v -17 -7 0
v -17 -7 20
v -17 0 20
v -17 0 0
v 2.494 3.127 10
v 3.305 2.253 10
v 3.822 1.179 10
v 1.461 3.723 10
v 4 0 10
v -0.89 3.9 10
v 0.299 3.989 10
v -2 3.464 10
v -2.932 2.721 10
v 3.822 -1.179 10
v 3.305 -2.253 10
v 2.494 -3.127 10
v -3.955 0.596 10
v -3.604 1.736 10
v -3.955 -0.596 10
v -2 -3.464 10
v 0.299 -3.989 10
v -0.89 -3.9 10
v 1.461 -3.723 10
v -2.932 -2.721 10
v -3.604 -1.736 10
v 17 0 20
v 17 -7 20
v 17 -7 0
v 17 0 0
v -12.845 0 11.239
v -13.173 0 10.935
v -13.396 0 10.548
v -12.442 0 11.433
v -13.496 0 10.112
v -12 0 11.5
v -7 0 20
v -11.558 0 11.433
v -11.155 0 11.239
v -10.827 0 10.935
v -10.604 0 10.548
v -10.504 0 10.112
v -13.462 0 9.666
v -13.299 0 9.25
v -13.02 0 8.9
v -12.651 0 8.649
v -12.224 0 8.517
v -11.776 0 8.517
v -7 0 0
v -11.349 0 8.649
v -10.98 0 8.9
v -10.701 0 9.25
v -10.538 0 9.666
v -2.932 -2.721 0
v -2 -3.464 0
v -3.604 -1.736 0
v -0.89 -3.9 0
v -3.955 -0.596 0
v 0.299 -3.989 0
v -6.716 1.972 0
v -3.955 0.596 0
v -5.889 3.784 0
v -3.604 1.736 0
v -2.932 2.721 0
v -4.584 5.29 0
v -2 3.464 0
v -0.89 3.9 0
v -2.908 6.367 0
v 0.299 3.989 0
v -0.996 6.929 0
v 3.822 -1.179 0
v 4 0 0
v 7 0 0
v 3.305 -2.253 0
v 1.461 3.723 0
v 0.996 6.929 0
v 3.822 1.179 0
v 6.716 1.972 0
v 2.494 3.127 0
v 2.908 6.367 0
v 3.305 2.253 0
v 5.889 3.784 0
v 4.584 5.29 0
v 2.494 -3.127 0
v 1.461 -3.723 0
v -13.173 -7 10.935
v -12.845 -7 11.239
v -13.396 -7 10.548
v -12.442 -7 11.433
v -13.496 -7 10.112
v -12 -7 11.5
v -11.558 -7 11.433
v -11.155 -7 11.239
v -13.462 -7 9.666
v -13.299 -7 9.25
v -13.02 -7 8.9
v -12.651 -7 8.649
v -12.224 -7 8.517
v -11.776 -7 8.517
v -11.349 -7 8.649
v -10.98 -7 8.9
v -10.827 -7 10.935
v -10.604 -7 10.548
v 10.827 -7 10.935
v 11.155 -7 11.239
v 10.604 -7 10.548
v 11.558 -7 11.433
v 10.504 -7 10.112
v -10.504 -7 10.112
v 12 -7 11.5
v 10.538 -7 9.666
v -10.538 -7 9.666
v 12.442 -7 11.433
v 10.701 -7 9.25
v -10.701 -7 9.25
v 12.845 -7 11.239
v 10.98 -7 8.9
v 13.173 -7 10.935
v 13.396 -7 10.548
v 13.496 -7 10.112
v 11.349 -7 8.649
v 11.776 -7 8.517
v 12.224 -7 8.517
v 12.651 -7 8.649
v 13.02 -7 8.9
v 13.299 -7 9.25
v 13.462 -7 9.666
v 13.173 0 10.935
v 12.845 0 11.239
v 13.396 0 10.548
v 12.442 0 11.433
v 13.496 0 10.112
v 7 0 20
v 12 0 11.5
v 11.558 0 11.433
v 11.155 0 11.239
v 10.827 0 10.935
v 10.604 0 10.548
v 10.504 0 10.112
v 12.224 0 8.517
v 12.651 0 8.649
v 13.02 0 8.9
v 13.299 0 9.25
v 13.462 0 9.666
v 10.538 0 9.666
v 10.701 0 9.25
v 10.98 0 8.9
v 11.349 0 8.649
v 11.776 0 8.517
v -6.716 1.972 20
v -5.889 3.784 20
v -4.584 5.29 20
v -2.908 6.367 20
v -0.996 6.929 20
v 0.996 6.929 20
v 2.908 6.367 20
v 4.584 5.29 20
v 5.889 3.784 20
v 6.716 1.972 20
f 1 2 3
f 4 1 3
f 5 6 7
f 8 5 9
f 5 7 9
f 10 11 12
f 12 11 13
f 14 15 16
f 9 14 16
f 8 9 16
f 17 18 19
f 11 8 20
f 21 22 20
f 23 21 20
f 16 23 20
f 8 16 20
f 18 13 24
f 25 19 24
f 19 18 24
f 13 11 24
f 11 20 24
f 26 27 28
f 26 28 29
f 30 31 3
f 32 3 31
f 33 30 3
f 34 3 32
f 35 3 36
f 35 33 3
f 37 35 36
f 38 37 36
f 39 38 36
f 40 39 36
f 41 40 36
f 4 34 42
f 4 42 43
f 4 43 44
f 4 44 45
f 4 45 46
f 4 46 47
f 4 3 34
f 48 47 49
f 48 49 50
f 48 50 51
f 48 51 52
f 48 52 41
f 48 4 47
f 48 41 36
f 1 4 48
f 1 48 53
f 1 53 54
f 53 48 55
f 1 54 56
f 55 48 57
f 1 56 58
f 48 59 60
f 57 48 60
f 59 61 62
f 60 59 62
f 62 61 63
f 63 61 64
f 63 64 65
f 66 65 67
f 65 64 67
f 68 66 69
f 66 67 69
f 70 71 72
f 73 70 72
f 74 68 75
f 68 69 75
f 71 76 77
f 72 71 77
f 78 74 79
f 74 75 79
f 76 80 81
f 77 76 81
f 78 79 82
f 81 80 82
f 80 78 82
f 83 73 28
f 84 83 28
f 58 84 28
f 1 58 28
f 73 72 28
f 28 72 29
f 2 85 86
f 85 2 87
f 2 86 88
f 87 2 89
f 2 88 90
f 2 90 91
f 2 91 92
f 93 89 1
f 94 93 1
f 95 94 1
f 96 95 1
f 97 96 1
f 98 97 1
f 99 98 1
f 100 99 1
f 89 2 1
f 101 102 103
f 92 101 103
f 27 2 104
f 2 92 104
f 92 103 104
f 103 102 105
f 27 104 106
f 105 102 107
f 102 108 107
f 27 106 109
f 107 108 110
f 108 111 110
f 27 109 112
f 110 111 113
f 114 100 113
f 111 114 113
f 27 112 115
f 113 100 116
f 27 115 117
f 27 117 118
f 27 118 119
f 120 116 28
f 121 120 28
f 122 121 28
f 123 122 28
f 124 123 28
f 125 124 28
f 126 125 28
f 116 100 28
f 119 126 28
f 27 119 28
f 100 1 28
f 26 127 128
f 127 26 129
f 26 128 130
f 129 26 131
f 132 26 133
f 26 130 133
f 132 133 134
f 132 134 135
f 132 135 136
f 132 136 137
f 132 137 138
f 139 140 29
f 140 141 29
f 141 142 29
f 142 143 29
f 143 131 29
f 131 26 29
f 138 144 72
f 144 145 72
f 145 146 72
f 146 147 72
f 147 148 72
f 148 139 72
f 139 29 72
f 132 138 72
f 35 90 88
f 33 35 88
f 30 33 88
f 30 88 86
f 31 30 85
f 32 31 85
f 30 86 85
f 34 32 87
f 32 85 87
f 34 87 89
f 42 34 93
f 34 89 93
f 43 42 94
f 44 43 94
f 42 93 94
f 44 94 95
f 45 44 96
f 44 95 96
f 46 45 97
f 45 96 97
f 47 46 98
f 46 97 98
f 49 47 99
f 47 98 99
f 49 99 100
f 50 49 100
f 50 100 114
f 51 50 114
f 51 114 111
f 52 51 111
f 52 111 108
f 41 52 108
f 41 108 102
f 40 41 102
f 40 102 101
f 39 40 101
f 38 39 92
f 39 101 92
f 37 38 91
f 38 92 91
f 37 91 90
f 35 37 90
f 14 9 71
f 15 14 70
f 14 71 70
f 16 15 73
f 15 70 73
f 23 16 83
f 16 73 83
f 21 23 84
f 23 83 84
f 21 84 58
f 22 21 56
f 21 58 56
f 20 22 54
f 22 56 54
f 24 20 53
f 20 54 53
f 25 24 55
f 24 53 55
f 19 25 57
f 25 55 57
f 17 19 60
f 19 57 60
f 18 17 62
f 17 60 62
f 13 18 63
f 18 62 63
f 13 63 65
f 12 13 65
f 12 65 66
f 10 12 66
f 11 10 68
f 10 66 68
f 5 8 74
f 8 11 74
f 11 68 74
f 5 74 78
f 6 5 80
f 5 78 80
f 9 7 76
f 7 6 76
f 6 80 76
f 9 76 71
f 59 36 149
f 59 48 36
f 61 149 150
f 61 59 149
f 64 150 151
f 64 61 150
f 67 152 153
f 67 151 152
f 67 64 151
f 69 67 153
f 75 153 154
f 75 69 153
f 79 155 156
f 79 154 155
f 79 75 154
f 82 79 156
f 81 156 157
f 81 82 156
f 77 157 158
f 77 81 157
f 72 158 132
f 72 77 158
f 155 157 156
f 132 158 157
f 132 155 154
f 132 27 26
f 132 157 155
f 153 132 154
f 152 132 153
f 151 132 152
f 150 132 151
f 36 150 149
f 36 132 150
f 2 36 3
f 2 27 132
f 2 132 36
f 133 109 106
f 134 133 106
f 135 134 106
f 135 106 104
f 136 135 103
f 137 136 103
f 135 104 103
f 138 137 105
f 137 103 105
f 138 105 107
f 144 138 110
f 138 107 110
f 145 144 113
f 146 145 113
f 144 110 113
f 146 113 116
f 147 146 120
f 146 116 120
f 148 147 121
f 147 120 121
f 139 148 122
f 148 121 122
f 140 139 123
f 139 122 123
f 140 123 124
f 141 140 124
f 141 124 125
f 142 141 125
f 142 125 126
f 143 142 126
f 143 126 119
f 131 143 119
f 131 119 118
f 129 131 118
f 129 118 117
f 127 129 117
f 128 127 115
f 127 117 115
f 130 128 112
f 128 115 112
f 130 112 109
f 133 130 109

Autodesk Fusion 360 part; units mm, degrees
sketch "Sketch1" plane through (0, 0, 0) normal (0, 0, 1) x (1, 0, 0)
  circle A0 centre (0, 0) radius 4
  circle A1 centre (0, 0) radius 7
  line L0 (0, -6) -> (0, -7.3)
  line L1 (0, -7) -> (17, -7)
  line L2 (17, -7) -> (17, 0)
  line L3 (17, 0) -> (0, 0)
  line L4 (0, 0) -> (0, -7)
  line L5 (0, -7) -> (-17, -7)
  line L6 (-17, -7) -> (-17, 0)
  line L7 (-17, 0) -> (0, 0)
  line L8 (0, 0) -> (0, -7)
  line L9 (0.2459, 6.9957) -> (17, 0)
  line L10 (0.2459, 6.9957) -> (-17, 0)
  dimension "d1" = 8
  dimension "d2" = 14
  dimension "d3" = 17
  dimension "d4" = 7
extrude "Extrude1" add sketch "Sketch1" along normal blind 20 contours A0 A1 L0 L3 L4 L8 | A0 A1 L3 L7 L9 L10 | A0 A1 L0 L4 L7 L8 | A1 L1 L2 L3 | A1 L5 L6 L7 | A1 L9 | A1 L10
sketch "Sketch2" plane through (0, 0, 20) normal (0, 0, 1) x (-1, 0, 0)
  circle A0 centre (0, 0) radius 4
  line L0 (17, 7) -> (-17, 7)
  line L1 (-17, 7) -> (-17, 0)
  line L2 (-17, 0) -> (-7, 0)
  arc A1 (-7, 0) -> (7, 0) centre (0, 0) ccw
  line L3 (7, 0) -> (17, 0)
  line L4 (17, 0) -> (17, 7)
  circle A2 centre (0, 0) radius 4
extrude "Extrude2" add sketch "Sketch2" against normal blind 10 contours A0 A2
sketch "Sketch3" plane through (0, 0, 0) normal (0, 1, 0) x (-1, 0, 0)
  line L0 (-17, 0) -> (-7, 0)
  line L1 (-7, 0) -> (-7, 20)
  line L2 (-7, 20) -> (-17, 20)
  line L3 (-17, 20) -> (-17, 0)
  line L4 (-12, 0) -> (-12, 20) construction
  line L5 (-17, 10) -> (-7, 10) construction
  circle A0 centre (-12, 10) radius 1.5
  line L6 (0, 20) -> (0, 0) construction
  circle A1 centre (12, 10) radius 1.5
  dimension "d9" = 3
hole "Hole1" at (12, 0, 10) at (-12, 0, 10) direction (0, -1, 0) diameter 3 depth 11 tip angle 118
